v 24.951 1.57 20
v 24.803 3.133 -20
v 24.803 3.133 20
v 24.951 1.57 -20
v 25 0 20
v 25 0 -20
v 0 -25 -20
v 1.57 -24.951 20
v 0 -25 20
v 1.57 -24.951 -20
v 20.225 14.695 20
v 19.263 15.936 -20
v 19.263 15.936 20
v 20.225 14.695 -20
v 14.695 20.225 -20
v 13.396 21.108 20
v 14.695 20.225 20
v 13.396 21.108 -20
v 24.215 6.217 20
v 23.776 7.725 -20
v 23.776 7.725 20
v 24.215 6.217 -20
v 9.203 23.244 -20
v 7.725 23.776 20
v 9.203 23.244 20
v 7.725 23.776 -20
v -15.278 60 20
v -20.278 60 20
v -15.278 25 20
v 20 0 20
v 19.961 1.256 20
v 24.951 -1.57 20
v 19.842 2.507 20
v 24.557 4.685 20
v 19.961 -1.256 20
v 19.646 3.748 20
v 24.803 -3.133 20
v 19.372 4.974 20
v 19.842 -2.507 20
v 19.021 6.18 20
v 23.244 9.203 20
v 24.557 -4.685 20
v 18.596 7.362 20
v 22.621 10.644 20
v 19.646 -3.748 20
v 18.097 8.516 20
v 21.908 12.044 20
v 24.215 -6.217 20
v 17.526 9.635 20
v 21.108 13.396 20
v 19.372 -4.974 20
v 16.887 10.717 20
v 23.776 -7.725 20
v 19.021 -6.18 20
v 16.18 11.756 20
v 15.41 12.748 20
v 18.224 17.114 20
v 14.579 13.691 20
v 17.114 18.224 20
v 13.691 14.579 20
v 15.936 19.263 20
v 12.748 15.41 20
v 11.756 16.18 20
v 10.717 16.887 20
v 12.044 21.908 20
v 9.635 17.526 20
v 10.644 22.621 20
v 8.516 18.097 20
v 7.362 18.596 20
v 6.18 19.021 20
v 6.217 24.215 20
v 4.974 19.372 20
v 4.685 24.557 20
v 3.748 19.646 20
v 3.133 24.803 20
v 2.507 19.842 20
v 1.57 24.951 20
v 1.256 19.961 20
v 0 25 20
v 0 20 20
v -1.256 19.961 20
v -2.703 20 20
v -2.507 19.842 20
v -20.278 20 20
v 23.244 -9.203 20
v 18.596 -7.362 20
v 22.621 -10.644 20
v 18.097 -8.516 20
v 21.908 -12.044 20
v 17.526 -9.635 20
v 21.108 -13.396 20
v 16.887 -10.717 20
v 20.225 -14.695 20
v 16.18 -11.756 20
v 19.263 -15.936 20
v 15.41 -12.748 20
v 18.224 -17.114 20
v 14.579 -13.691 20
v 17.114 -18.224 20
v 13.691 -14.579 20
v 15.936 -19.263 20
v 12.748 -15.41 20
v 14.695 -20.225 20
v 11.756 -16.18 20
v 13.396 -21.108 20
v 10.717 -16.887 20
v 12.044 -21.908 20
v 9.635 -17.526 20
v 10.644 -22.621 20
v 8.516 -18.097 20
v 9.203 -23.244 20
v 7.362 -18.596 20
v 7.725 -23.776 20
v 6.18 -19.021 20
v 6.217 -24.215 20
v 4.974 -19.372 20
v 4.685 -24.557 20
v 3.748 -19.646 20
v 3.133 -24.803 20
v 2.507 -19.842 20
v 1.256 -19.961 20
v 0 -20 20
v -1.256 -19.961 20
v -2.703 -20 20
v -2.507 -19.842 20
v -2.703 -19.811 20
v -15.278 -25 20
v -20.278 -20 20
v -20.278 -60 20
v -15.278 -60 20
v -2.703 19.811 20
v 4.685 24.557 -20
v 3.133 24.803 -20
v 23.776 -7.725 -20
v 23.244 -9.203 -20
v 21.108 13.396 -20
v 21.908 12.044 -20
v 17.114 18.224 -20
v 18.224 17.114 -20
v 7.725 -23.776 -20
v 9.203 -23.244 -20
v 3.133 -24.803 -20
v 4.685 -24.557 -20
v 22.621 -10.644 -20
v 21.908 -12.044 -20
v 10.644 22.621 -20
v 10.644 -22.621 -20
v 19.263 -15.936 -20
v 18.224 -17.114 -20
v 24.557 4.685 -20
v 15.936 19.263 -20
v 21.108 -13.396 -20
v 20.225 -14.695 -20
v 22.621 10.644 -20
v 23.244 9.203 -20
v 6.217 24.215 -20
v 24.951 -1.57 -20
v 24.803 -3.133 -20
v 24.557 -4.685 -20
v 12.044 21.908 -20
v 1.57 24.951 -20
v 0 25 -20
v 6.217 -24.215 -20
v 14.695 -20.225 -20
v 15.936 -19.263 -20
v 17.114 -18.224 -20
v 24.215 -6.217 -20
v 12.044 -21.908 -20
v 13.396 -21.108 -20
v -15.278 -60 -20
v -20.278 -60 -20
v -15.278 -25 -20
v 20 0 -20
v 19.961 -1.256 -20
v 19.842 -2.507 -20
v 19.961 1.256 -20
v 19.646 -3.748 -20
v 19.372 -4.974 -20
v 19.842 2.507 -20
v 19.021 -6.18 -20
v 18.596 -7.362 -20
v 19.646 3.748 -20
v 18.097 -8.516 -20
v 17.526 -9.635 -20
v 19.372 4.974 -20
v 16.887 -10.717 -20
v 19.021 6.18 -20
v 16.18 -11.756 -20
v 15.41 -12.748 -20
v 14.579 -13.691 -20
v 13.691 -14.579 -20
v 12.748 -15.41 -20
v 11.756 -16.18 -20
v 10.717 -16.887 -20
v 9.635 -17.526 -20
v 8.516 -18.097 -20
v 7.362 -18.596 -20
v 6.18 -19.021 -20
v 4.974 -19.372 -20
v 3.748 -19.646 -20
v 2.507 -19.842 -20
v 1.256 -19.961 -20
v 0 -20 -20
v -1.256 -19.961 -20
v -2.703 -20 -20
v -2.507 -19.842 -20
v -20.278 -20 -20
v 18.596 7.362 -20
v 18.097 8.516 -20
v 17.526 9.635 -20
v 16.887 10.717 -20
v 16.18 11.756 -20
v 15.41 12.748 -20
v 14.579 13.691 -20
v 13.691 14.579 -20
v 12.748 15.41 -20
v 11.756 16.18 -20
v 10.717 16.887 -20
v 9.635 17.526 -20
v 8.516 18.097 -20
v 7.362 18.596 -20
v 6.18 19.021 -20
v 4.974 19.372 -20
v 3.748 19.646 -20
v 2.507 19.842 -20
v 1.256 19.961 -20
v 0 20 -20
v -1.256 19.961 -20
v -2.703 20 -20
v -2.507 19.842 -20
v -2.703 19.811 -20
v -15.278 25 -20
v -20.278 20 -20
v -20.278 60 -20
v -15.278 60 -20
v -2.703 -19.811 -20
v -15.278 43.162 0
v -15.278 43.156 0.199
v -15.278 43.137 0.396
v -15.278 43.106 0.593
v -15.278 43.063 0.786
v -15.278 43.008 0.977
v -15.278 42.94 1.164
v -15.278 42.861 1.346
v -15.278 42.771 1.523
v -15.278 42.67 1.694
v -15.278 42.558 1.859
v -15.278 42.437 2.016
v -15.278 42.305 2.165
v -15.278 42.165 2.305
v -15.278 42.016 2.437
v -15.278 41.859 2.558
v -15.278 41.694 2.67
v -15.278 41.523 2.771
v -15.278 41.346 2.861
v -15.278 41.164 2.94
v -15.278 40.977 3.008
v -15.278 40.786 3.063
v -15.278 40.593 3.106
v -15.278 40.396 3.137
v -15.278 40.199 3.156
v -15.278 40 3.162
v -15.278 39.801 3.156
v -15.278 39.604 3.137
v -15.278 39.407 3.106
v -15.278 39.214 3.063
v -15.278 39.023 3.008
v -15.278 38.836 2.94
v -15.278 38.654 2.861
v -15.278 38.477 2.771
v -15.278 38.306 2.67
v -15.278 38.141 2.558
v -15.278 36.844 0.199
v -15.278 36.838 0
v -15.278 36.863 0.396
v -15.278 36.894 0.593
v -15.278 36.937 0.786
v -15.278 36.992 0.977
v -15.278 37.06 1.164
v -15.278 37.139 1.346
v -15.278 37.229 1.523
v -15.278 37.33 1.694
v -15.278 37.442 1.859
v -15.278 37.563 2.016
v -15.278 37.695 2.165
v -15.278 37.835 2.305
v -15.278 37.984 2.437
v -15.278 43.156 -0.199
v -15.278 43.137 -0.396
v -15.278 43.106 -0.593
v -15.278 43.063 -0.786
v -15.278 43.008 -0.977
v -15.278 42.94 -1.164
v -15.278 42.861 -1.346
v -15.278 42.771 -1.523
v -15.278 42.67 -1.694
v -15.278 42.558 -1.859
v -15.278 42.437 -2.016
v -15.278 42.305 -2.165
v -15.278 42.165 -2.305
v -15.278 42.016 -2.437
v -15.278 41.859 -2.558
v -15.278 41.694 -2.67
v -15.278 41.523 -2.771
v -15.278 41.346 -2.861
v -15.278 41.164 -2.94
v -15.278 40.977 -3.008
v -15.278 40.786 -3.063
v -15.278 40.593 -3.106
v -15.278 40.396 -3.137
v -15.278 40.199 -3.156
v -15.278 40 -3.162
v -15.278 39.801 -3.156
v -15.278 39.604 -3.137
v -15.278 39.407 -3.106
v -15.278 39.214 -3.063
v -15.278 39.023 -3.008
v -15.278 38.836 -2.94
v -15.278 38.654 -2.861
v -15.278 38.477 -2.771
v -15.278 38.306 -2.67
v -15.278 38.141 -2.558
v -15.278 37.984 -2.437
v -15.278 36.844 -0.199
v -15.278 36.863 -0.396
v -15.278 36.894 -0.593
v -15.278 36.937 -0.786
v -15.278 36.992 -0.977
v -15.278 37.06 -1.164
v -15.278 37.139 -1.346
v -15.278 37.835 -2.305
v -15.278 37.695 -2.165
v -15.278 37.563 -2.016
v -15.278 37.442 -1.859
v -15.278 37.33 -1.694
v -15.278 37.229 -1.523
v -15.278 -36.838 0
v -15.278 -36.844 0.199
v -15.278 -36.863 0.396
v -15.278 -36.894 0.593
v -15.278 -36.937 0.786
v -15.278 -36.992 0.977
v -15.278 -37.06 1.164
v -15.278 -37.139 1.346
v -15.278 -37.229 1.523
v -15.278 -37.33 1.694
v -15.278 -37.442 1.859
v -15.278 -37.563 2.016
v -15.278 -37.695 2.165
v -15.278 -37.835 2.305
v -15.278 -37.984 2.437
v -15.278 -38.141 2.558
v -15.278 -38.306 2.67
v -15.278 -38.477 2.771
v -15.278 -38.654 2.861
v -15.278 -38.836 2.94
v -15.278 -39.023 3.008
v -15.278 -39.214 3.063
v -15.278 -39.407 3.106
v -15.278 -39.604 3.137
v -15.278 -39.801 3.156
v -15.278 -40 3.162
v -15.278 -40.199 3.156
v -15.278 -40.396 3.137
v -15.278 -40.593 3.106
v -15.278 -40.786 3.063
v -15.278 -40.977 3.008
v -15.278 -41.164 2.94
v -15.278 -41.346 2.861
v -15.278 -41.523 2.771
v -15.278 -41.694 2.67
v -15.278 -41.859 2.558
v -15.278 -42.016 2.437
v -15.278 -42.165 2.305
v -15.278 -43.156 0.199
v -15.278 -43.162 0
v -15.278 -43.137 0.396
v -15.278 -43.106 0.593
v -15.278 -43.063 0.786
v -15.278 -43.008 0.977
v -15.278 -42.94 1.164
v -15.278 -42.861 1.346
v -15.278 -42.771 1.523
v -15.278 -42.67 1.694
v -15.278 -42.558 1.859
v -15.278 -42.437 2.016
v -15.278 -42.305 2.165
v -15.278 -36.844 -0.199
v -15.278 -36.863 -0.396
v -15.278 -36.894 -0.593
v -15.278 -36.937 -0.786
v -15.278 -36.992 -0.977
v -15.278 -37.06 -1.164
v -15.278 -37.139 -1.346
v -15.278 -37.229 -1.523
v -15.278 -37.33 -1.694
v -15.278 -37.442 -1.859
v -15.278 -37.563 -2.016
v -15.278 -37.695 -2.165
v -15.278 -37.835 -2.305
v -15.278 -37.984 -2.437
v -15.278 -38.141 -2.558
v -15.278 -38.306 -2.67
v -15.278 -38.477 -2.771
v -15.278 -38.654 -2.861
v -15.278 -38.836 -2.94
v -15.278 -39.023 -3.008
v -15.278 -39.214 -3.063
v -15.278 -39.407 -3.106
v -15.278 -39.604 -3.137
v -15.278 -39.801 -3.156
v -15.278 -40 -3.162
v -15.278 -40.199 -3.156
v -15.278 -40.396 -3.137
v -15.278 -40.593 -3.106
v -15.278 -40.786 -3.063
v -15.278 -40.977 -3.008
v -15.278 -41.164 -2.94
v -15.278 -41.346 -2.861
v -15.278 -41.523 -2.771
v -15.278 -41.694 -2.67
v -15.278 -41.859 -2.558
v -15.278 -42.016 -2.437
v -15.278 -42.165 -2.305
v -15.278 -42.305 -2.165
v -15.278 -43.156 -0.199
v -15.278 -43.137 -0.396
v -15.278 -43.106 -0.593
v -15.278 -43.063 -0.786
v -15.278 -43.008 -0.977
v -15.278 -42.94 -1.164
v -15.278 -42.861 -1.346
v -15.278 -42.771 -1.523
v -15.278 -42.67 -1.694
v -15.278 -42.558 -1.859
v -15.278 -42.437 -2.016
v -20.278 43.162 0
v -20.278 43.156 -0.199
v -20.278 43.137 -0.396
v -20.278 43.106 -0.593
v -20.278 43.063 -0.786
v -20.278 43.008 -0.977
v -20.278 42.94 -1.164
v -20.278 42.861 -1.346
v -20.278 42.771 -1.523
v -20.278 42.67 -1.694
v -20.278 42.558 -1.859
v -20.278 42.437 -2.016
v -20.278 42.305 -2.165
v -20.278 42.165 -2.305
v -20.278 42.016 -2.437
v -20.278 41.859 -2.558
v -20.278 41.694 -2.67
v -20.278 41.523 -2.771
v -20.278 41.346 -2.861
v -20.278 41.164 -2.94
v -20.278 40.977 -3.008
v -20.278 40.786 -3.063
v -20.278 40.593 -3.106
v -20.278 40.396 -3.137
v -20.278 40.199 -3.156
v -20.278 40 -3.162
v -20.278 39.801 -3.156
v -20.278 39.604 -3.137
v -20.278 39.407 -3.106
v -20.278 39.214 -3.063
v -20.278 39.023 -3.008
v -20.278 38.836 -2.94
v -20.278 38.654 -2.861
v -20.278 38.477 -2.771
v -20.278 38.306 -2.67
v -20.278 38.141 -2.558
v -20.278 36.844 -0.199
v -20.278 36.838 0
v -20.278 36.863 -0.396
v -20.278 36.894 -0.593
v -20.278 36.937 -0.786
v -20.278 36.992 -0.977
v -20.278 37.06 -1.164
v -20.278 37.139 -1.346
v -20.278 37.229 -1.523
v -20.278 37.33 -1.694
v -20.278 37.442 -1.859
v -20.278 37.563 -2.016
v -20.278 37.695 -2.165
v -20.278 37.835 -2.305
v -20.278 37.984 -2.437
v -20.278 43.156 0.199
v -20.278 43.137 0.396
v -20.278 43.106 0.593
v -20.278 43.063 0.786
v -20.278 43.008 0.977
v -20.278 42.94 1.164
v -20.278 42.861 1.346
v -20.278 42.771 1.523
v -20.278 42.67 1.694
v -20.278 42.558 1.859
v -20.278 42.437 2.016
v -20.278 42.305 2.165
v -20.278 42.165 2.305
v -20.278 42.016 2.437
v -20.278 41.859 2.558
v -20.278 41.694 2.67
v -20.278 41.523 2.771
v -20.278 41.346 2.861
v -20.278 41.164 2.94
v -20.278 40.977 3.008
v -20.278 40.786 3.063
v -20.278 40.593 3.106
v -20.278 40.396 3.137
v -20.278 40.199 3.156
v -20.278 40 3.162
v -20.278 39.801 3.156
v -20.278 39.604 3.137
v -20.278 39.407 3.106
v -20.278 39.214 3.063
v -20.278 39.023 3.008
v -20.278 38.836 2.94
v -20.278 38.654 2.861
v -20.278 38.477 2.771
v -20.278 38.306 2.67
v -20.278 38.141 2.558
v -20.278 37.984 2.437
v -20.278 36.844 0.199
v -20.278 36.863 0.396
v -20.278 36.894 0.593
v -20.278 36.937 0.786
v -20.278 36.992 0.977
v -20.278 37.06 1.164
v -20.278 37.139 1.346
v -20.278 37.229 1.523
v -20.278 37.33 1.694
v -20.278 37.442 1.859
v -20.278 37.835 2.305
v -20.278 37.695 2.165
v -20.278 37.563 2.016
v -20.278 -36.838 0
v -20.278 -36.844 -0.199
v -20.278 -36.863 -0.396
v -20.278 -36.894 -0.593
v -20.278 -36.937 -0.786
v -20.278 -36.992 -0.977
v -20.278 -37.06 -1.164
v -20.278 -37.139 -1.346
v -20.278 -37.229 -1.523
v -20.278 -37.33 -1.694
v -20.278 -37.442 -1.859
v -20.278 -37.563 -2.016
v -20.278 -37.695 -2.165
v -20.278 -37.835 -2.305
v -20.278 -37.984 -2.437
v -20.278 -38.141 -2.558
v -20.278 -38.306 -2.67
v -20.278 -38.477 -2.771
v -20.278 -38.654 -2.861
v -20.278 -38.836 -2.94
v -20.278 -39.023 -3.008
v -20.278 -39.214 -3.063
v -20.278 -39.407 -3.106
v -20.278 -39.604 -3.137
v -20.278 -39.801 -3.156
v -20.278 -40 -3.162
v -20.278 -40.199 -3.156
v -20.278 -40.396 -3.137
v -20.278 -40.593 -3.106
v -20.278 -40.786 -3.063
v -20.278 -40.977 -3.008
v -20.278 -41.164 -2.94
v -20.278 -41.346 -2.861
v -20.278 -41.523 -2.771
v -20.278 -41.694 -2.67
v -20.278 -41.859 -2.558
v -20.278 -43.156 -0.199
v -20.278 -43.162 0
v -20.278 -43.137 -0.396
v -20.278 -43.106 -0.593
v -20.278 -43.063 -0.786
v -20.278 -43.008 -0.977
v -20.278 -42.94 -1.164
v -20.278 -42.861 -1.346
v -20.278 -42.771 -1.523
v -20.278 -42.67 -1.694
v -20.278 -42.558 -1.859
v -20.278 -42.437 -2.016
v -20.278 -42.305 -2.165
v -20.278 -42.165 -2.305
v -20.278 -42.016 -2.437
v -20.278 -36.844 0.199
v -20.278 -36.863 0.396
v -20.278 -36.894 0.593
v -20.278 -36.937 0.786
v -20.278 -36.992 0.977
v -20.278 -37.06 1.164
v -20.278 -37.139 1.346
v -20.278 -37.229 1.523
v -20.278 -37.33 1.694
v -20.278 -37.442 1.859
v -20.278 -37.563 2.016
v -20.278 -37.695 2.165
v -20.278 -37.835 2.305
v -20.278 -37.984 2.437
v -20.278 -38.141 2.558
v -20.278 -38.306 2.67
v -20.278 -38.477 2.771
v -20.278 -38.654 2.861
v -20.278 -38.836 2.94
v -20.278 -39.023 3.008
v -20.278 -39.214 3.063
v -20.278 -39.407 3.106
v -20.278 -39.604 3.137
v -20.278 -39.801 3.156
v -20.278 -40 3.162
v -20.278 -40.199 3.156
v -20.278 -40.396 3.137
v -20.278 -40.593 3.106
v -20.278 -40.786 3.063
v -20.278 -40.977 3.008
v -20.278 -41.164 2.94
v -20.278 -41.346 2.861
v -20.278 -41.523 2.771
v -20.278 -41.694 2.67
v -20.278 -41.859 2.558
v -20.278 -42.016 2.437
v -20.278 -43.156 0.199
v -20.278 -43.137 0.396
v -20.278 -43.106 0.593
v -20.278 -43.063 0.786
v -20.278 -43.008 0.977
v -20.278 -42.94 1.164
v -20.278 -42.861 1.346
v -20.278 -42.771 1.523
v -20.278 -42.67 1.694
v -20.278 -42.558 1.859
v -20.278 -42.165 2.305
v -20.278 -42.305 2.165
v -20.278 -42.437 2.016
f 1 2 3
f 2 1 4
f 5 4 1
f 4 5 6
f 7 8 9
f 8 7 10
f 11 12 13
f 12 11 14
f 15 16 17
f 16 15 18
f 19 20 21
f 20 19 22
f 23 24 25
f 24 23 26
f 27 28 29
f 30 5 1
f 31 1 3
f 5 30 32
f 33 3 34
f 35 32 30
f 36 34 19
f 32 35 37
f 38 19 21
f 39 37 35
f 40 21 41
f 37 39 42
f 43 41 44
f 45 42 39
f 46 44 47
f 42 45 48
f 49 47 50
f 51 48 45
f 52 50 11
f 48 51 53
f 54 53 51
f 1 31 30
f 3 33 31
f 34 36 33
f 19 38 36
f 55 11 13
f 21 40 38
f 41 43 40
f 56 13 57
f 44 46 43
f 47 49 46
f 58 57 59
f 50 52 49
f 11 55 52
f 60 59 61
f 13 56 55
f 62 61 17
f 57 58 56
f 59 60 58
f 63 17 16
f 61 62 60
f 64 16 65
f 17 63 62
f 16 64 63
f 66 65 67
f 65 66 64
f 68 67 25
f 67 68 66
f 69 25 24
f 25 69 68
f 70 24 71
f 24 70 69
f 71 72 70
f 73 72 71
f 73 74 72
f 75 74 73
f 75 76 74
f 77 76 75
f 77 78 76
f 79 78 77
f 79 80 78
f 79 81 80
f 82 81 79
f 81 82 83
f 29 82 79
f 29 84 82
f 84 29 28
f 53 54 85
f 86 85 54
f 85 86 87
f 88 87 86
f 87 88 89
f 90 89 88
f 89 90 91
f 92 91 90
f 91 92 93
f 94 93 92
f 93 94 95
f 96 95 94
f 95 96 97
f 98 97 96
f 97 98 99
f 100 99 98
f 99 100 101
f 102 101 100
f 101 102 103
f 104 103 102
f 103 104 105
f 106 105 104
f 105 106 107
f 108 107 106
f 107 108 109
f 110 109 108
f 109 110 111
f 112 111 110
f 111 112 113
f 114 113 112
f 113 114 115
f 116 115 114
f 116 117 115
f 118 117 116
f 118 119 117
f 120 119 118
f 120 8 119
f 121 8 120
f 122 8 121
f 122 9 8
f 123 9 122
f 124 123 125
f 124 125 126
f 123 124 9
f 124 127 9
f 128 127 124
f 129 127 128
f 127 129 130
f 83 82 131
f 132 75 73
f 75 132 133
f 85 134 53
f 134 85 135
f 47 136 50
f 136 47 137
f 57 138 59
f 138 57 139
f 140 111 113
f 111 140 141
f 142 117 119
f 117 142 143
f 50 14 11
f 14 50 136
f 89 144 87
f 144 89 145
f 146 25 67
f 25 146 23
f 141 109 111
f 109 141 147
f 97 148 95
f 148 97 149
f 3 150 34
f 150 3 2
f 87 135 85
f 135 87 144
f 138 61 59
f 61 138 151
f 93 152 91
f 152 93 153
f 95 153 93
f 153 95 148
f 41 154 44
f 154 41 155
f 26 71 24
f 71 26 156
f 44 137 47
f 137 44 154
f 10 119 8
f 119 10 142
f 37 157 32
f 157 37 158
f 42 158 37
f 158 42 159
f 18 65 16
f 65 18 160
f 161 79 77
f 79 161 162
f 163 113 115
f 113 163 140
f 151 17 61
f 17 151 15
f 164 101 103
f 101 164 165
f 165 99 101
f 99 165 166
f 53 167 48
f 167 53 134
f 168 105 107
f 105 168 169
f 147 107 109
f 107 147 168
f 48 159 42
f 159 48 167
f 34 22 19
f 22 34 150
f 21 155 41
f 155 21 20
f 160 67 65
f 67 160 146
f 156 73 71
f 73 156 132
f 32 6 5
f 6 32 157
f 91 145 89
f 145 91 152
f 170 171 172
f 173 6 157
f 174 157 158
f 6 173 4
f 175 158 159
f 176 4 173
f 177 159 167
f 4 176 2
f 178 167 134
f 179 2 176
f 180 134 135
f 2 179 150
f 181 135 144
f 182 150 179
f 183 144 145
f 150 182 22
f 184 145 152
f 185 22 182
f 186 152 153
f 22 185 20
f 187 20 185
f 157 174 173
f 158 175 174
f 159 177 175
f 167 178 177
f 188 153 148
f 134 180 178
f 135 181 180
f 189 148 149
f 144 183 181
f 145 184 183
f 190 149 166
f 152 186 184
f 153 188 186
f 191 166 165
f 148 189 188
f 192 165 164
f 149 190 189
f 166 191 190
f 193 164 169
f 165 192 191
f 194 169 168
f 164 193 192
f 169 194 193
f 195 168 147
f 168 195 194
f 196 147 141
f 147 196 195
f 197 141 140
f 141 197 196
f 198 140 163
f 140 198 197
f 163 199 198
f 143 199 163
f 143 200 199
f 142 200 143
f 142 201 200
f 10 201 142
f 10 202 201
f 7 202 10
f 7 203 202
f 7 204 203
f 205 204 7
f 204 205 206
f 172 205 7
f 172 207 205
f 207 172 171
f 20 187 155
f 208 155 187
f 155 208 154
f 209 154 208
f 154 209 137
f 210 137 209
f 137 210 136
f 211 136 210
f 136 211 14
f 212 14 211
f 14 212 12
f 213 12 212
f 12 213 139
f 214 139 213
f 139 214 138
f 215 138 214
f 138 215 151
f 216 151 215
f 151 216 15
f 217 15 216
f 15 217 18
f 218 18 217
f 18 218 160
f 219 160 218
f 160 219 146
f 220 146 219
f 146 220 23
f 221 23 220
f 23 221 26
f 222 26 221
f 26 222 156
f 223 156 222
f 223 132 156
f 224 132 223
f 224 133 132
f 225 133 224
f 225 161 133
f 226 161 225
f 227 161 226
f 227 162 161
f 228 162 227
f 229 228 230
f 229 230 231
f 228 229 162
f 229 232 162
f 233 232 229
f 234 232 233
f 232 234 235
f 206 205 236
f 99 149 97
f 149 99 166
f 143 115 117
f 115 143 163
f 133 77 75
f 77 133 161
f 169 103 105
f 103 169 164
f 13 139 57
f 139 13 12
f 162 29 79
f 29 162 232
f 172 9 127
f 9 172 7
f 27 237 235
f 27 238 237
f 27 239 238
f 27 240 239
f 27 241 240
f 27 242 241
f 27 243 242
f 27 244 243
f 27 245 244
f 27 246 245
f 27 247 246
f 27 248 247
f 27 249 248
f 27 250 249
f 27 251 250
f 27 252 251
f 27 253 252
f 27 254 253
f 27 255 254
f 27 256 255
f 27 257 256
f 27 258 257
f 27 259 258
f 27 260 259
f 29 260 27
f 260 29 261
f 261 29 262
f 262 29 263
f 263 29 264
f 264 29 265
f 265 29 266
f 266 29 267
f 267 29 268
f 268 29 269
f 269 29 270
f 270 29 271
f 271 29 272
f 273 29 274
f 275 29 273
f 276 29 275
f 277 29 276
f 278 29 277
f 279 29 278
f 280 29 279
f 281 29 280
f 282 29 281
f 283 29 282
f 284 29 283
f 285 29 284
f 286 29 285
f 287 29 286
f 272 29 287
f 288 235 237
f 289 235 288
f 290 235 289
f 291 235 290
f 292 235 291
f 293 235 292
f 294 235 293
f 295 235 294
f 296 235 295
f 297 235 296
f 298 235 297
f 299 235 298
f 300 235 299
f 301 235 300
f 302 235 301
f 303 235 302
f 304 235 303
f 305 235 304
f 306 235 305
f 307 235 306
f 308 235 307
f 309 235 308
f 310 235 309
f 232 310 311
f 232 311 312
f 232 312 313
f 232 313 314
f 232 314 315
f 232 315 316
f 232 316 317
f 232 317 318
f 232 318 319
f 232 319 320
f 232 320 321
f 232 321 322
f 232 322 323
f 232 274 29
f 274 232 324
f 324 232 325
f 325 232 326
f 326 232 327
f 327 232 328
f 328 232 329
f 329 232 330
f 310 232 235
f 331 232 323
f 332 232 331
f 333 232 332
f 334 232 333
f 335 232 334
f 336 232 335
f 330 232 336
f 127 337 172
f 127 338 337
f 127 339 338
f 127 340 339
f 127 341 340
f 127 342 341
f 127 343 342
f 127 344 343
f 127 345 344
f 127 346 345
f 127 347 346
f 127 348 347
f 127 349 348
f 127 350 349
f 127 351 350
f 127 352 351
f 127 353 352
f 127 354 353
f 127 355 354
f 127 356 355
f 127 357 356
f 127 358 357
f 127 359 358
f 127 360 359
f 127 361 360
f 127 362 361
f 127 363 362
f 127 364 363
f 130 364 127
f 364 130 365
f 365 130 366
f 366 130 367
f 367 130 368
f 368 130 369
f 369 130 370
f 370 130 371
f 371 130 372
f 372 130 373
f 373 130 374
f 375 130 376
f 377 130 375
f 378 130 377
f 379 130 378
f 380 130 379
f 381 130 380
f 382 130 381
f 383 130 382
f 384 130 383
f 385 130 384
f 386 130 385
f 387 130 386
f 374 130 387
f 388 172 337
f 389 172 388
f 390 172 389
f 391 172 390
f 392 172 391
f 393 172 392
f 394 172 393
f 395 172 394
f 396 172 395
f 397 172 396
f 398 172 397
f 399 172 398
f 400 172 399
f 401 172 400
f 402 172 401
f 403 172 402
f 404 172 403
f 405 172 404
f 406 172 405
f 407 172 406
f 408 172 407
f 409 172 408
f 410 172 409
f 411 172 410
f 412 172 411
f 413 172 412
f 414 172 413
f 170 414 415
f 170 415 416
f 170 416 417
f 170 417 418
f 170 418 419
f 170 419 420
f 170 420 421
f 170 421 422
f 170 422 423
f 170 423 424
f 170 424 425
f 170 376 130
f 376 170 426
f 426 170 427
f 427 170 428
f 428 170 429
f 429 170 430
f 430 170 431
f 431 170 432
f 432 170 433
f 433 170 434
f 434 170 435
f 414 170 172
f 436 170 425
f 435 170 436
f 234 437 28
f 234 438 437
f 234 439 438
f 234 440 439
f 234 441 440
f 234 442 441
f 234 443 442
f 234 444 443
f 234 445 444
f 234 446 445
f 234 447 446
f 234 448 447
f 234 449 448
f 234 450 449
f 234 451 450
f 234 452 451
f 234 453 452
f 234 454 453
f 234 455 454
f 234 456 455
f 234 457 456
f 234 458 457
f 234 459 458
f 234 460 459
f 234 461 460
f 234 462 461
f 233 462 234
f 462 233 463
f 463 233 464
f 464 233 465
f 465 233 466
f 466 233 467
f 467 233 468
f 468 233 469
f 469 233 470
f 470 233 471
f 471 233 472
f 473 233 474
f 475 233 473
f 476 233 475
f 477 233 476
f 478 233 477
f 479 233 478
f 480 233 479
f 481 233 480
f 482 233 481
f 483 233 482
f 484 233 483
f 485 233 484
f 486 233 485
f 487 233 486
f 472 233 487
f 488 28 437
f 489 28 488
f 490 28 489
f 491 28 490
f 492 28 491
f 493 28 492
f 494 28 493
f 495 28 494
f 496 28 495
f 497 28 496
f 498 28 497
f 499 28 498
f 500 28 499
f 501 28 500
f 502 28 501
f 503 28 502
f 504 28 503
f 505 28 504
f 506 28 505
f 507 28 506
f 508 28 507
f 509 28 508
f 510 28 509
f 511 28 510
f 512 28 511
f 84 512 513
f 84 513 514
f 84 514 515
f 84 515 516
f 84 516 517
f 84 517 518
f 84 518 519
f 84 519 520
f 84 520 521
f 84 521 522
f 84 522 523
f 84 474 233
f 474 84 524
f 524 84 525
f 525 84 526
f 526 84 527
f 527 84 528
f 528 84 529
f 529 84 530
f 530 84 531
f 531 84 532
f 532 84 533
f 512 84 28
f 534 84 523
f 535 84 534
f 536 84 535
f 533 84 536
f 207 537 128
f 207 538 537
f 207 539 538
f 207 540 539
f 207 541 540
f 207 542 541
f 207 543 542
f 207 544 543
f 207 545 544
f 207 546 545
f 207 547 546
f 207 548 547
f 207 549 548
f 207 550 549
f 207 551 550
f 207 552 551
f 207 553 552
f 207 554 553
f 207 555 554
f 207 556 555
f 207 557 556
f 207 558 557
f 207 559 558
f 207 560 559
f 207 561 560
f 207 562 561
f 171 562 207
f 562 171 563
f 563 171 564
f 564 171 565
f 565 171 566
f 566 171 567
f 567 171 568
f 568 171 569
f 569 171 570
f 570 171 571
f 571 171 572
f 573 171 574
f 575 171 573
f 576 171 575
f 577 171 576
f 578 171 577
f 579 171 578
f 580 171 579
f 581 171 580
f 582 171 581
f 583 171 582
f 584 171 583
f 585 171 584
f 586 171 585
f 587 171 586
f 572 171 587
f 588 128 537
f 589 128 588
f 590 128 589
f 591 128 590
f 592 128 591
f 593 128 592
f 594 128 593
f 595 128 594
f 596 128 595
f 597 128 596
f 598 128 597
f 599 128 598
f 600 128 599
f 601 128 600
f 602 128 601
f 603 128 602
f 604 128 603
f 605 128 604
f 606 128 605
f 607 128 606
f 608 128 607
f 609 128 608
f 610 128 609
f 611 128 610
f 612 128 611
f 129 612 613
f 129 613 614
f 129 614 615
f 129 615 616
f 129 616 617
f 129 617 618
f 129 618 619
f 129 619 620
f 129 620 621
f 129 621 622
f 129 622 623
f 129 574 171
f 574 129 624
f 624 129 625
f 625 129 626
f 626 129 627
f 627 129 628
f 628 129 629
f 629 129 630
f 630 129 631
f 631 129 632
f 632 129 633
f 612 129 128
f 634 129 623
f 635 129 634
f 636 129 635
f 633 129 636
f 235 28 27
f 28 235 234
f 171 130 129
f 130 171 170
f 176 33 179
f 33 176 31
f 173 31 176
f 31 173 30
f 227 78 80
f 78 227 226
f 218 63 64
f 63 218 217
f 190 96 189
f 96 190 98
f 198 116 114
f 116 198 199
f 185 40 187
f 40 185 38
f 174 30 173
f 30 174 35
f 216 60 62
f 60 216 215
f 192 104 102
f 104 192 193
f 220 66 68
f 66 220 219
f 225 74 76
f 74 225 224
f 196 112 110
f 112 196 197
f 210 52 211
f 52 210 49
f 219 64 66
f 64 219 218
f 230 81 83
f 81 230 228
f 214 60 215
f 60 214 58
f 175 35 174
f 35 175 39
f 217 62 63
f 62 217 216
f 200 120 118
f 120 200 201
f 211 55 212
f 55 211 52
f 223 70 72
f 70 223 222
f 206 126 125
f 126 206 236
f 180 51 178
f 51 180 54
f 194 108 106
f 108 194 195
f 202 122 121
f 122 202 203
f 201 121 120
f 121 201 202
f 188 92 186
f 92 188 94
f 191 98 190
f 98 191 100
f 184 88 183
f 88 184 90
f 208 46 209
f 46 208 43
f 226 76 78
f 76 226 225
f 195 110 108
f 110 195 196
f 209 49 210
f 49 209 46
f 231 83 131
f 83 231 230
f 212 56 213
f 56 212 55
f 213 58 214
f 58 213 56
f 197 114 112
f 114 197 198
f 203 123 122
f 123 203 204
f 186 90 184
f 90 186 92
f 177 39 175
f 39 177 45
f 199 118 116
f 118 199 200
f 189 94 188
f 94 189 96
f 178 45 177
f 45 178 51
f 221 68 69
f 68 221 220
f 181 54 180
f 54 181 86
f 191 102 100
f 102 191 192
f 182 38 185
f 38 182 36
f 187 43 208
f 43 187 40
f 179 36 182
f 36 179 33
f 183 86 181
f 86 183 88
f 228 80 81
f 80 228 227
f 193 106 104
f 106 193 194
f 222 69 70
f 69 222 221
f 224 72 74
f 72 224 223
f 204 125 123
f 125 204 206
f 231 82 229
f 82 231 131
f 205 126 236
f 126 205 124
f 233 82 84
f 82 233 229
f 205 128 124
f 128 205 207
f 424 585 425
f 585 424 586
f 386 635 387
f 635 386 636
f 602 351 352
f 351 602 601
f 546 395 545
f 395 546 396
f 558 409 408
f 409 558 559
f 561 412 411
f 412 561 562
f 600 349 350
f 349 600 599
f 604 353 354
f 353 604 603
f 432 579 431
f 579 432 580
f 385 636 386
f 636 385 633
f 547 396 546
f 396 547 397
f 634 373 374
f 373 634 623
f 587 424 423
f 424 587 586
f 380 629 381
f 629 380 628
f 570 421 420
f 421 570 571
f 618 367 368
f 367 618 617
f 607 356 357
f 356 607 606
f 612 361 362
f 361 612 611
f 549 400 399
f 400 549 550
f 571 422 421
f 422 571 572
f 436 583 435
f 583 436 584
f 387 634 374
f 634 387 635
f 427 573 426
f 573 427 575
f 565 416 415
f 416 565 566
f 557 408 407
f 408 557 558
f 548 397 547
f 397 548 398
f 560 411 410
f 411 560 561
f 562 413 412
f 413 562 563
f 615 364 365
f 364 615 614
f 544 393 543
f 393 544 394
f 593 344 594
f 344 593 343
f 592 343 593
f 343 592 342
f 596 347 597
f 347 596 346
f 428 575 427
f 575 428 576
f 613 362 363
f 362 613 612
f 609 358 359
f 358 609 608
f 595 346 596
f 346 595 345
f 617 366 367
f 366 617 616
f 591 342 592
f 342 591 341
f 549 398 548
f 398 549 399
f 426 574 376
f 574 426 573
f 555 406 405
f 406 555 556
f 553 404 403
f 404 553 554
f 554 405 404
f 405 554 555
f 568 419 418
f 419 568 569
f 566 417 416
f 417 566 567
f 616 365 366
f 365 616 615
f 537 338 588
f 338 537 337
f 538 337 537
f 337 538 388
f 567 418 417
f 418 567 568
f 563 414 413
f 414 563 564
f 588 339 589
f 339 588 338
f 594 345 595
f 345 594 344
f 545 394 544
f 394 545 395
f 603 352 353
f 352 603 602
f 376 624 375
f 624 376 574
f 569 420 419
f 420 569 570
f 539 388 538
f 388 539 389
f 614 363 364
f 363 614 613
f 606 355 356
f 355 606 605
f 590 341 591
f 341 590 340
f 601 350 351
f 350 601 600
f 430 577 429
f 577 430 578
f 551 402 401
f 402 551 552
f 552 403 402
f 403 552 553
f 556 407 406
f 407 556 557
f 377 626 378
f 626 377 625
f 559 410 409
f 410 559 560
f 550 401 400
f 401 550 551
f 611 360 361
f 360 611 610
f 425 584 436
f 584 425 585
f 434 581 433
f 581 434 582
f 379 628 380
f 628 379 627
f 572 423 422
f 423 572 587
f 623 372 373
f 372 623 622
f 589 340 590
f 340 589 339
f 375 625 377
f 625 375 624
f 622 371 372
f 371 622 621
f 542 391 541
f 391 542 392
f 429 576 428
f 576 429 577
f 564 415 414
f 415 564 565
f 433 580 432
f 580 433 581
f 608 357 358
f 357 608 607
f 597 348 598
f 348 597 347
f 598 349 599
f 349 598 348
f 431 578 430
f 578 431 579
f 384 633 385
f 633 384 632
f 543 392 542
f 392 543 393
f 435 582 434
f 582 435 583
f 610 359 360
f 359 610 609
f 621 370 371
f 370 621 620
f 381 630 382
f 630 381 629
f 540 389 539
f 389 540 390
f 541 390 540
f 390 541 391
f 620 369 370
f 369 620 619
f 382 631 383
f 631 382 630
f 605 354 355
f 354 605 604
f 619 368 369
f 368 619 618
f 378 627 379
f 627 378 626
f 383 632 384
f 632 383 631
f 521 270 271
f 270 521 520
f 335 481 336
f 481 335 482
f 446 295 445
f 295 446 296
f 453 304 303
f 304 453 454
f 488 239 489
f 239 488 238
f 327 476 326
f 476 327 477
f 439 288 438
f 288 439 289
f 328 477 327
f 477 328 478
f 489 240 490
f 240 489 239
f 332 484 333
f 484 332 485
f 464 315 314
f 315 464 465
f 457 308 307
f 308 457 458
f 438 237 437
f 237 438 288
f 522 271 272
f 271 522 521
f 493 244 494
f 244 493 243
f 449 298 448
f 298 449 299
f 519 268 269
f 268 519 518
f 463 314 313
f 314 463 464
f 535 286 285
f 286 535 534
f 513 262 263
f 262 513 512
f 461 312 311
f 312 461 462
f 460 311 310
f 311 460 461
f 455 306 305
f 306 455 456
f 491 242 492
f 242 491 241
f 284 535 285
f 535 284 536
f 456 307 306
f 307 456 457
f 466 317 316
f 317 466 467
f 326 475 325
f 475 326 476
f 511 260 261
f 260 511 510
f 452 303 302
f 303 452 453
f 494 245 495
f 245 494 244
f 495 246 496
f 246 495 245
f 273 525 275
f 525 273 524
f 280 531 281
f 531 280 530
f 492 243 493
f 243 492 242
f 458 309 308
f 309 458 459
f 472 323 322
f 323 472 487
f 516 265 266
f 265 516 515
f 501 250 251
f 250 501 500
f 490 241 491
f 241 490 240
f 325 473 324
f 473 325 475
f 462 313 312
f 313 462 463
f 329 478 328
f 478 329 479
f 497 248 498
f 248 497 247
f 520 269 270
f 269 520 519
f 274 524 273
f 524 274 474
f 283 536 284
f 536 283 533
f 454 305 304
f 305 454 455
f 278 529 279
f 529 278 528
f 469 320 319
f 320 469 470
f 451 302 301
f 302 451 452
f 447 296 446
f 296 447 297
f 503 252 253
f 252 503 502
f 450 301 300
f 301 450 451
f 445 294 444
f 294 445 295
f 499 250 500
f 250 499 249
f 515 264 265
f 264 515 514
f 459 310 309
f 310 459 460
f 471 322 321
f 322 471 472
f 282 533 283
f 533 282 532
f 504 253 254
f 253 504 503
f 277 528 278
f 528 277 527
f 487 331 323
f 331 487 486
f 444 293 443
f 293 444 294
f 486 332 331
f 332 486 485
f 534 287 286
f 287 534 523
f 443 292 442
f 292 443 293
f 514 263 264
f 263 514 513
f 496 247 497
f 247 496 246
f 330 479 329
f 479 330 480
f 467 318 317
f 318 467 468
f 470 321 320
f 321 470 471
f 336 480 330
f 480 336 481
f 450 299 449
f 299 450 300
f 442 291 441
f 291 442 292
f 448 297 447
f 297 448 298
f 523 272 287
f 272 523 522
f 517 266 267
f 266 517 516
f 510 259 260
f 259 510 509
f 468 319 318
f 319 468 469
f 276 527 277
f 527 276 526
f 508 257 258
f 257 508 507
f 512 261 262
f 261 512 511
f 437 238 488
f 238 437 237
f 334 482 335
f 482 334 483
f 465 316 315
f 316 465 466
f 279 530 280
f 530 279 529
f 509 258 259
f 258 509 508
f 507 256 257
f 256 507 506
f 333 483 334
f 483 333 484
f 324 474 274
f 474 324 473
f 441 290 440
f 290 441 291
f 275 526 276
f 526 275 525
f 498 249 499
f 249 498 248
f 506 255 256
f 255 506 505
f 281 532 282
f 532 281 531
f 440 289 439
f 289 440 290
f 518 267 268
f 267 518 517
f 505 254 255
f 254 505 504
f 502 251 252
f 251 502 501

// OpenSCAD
//U-Clamp for Pipe in mm
//25.4mm = 1 inch

// Enter your Diameter of Pipe
pipe_dia=40;

difference(){
difference(){
union(){cylinder($fn=100, h=pipe_dia, d=pipe_dia*1.25, center=true);
translate([-pipe_dia/4,0,0])
    cube([pipe_dia/2, pipe_dia*1.25, pipe_dia], center=true);
translate([(-pipe_dia/2.25),0,0])
    cube([(pipe_dia*1.25-pipe_dia)/2,pipe_dia*3,pipe_dia],center=true);}
cylinder($fn=100,h=pipe_dia+1, d=pipe_dia, center=true);
translate([(-pipe_dia/2)-sqrt(pipe_dia/3.9),0,0])    
cube([pipe_dia+1,pipe_dia,pipe_dia+1], center=true);}
translate([0,-pipe_dia,0])
rotate([0,90,0])
cylinder($fn=100, d=sqrt(pipe_dia), h=pipe_dia*5, center=true);
translate([0,pipe_dia,0])
rotate([0,90,0])
cylinder($fn=100, d=sqrt(pipe_dia), h=pipe_dia*5, center=true);}
